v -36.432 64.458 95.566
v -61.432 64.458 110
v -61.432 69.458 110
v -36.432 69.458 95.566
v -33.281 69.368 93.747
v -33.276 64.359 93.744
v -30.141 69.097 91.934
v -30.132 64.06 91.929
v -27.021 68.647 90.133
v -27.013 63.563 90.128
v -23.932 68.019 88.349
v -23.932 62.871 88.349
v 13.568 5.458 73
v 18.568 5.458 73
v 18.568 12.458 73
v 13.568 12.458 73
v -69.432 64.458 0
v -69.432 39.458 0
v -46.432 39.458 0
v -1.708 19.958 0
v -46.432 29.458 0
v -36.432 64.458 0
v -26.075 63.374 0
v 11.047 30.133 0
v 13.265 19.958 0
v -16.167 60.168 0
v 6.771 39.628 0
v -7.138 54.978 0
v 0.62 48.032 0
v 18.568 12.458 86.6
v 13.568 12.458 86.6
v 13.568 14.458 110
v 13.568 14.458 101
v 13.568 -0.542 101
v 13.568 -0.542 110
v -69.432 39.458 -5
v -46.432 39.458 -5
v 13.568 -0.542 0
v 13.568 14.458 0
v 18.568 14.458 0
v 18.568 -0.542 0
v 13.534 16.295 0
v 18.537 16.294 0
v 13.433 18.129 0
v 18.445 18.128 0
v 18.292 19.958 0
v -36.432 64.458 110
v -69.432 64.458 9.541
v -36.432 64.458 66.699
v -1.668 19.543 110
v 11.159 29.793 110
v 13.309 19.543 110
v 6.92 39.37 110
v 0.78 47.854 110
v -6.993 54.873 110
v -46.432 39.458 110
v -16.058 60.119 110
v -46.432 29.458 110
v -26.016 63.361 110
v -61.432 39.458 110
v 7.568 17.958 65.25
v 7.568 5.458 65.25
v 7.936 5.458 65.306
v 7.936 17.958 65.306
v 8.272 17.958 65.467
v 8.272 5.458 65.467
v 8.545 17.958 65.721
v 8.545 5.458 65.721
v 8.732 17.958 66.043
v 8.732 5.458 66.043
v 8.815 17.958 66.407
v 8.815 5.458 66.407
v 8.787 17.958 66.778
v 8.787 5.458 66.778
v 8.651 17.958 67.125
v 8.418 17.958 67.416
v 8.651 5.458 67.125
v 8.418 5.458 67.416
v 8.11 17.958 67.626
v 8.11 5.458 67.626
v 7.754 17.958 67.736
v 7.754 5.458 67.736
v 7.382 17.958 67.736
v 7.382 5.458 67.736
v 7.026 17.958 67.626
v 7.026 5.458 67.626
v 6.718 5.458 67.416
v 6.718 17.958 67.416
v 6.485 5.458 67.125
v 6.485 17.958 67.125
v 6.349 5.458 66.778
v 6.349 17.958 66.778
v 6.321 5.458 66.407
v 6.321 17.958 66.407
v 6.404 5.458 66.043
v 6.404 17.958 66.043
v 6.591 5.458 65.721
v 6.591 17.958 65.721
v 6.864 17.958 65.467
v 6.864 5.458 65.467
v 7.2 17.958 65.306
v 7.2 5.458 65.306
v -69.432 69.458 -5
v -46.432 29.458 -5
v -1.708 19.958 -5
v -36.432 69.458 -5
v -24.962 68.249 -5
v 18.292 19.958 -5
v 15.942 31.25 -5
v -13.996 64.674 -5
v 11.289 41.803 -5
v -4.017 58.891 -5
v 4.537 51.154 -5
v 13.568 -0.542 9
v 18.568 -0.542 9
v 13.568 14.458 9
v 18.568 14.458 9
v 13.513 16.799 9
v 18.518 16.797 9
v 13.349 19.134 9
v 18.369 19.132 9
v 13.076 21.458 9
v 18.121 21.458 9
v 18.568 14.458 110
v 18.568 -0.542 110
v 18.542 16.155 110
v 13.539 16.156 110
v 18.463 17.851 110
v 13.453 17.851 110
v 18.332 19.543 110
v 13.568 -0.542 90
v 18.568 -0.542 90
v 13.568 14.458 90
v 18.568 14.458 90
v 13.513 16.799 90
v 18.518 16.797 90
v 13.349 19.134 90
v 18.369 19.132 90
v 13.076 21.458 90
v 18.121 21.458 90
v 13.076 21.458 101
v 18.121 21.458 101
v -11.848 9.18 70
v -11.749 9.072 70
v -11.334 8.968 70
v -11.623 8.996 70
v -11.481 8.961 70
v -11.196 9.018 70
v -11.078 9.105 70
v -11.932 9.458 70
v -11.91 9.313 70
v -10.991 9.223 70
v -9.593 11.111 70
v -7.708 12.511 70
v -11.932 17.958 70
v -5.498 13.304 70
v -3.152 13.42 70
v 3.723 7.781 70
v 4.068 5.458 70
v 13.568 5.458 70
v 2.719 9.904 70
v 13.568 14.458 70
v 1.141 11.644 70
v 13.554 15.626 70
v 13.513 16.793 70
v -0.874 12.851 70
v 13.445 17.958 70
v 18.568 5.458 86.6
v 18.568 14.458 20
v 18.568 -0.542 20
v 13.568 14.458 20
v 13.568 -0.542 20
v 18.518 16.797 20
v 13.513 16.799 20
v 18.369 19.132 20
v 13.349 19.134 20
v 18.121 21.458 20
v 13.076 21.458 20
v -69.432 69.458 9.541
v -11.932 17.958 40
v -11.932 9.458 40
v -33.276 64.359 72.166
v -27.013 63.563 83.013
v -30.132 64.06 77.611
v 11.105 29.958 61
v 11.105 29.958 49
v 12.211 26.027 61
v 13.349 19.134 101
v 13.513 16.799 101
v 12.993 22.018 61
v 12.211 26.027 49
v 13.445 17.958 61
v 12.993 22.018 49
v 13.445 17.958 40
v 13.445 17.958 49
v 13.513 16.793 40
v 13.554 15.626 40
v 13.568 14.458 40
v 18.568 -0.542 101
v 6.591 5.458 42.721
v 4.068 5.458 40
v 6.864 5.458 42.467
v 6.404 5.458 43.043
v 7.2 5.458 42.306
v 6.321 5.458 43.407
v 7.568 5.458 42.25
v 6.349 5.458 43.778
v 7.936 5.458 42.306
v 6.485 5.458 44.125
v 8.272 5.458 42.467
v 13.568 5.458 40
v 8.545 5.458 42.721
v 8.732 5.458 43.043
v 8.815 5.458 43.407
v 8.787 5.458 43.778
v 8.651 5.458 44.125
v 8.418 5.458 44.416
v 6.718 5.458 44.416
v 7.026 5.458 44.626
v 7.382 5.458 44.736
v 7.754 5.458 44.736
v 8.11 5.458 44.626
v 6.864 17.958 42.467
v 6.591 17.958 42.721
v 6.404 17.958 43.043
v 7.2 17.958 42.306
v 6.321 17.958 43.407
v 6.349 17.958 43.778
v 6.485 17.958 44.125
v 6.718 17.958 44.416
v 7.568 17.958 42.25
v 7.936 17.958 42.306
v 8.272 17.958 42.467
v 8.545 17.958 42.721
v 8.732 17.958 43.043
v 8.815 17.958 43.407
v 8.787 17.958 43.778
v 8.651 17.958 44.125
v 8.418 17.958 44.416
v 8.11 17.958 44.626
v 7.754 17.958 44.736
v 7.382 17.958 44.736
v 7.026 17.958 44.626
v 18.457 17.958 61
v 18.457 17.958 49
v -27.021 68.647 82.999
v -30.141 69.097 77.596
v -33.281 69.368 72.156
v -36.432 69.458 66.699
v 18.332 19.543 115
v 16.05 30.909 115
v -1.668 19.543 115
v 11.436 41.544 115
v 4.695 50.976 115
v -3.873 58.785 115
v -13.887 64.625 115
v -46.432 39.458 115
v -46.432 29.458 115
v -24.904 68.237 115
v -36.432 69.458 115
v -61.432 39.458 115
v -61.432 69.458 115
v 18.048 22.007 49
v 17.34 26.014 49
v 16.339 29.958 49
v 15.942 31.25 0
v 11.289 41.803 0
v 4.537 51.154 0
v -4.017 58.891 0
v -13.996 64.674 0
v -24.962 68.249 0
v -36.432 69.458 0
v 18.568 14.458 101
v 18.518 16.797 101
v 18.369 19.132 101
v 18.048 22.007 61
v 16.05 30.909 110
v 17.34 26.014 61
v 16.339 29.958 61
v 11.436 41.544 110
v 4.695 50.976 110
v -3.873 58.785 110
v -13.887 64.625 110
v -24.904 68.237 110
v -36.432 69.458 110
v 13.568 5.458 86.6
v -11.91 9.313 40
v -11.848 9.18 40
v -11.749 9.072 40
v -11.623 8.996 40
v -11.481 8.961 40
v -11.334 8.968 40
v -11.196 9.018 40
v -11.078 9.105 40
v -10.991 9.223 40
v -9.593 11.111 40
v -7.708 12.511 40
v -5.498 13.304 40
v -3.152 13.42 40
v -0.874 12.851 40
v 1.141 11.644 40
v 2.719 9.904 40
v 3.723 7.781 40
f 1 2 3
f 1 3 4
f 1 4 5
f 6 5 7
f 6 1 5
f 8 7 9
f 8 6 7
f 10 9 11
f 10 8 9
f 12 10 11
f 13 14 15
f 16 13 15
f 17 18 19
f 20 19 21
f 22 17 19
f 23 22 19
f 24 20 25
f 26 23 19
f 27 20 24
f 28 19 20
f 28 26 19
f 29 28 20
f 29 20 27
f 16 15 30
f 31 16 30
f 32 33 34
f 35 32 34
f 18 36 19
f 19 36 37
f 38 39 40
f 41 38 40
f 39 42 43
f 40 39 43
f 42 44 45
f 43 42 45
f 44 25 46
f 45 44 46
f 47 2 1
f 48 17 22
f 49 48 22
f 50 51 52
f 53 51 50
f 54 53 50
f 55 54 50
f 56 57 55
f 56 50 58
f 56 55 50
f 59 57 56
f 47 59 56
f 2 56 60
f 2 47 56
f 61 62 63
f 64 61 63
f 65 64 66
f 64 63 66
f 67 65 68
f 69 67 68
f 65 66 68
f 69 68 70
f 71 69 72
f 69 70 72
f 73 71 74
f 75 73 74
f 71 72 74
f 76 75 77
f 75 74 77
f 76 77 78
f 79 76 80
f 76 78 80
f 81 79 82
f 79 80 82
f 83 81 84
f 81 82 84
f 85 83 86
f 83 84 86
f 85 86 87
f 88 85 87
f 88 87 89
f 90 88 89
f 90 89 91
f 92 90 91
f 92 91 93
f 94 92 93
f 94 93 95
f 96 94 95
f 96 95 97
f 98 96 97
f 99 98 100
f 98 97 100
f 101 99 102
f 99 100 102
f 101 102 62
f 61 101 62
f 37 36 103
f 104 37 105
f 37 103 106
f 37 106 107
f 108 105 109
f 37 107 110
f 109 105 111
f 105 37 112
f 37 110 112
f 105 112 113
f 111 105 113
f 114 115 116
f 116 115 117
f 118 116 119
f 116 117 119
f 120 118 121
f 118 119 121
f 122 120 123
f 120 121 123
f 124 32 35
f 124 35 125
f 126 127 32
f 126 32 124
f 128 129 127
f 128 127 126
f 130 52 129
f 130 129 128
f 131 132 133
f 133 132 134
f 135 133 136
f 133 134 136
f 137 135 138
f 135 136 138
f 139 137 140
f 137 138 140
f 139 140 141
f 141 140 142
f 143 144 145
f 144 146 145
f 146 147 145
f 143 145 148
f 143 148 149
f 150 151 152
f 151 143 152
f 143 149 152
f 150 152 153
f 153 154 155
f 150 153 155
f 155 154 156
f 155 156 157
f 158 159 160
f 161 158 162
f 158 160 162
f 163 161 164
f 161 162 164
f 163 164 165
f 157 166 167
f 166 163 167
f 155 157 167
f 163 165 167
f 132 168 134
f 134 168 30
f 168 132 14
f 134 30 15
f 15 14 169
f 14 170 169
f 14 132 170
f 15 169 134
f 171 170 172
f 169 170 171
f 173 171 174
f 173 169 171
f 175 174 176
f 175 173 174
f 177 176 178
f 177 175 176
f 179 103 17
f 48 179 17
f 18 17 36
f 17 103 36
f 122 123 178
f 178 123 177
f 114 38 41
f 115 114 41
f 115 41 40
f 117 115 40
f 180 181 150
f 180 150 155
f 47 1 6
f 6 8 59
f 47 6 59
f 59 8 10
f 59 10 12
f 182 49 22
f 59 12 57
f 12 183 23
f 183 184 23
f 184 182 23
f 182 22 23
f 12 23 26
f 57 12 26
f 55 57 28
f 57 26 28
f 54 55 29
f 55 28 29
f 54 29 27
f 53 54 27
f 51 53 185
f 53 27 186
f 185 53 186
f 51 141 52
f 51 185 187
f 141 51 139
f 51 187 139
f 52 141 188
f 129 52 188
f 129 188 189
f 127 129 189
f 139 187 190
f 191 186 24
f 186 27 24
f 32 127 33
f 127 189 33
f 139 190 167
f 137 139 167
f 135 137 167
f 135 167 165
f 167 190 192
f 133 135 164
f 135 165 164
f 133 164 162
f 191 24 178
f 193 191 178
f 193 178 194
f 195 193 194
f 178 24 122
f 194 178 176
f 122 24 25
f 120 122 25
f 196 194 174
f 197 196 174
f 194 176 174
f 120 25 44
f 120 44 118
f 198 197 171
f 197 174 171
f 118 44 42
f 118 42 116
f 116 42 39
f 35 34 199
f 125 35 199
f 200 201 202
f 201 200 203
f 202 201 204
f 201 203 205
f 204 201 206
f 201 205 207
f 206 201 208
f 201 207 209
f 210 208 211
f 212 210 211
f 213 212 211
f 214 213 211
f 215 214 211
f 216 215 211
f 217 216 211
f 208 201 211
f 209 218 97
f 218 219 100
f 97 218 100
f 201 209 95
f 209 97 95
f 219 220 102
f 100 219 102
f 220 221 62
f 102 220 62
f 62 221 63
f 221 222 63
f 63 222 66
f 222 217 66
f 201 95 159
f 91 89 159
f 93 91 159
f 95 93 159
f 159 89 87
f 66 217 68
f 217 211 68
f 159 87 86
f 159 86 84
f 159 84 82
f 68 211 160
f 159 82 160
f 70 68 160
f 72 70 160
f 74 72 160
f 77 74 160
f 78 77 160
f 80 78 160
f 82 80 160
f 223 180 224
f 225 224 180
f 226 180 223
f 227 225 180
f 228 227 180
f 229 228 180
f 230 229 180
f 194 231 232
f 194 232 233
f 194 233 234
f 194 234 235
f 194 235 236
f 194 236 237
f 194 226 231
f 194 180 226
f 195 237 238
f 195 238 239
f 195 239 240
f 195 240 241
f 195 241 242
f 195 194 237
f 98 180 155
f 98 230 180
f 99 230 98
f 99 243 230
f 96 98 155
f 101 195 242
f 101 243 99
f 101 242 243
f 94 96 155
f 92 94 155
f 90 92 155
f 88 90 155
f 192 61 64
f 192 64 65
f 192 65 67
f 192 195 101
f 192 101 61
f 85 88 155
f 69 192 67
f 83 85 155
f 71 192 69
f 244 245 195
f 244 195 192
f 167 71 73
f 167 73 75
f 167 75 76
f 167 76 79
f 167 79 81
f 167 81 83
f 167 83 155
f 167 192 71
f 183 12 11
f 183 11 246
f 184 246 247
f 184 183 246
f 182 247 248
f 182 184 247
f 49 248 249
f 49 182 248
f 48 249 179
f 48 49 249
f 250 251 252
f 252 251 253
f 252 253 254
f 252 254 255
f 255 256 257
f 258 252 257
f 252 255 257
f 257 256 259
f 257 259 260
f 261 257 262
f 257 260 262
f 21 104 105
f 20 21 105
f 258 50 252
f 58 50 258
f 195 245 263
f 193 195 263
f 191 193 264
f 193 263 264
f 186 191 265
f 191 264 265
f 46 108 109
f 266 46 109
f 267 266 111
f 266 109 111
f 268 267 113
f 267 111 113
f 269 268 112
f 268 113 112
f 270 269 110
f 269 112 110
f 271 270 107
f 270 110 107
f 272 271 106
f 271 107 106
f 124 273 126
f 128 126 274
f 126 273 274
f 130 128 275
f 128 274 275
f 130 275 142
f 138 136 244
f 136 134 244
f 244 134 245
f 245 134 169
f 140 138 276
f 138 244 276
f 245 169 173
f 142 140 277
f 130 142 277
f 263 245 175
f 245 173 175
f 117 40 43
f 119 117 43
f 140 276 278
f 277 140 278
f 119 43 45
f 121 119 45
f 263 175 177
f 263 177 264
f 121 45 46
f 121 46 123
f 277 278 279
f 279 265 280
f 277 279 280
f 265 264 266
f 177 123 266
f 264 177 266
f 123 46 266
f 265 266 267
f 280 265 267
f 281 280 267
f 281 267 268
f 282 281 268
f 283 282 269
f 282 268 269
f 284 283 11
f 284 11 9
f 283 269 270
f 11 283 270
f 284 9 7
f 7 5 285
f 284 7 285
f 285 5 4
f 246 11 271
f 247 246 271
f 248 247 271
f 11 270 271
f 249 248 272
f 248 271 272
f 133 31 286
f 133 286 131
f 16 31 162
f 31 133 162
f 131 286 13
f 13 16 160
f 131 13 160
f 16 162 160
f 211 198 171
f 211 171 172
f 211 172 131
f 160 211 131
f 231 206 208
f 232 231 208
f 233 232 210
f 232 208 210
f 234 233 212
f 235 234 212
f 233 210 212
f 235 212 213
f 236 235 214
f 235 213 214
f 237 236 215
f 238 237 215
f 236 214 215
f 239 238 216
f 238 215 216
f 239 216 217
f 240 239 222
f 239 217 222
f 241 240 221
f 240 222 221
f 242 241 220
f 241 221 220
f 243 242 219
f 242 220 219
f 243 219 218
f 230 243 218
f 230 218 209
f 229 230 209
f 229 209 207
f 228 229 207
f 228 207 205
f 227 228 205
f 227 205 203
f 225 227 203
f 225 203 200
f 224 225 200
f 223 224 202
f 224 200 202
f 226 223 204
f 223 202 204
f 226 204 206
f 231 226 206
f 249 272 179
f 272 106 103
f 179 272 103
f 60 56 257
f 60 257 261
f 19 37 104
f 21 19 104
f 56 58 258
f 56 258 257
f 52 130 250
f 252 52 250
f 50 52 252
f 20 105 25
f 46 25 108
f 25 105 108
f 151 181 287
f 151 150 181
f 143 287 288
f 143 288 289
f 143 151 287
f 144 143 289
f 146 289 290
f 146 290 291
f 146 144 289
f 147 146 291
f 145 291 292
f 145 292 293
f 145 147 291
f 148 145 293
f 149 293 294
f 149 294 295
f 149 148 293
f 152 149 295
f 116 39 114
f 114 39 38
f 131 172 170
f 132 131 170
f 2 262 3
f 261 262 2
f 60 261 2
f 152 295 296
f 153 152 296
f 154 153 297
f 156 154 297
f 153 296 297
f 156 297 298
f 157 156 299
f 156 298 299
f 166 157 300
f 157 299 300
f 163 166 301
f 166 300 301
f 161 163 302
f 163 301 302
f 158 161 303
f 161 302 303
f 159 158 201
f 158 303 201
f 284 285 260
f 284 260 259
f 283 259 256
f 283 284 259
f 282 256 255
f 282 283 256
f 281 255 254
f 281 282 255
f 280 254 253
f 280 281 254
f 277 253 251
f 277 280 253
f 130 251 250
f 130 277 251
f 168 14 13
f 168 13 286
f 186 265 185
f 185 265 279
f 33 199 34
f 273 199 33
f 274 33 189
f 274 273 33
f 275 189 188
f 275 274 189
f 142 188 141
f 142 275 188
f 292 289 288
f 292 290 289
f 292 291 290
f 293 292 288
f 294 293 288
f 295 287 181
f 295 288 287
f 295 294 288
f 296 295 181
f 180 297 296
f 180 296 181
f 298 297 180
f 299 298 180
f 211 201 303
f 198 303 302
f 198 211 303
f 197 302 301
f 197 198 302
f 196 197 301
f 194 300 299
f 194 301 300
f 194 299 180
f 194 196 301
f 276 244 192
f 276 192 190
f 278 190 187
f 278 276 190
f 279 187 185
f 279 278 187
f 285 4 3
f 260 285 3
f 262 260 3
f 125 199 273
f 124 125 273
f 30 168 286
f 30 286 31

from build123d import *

# Parameters (mm, degrees)
BOSS_EXTRUDE1_DEPTH     = 110
SKETCH2_W               = 30
SKETCH2_H               = 12.5
BOSS_EXTRUDE2_DEPTH     = 35
SKETCH3_R               = 8
CUT_EXTRUDE1_DEPTH      = 121.603742452
SKETCH4_R               = 1.5
SKETCH4_R_2             = 1.25
CUT_EXTRUDE2_DEPTH      = 12.5
SKETCH5_W               = 9.5
SKETCH5_H               = 12.5
CUT_EXTRUDE3_DEPTH      = 121.603742452
FILLET4_R               = 0.5
BOSS_EXTRUDE3_DEPTH     = 5
CUT_EXTRUDE4_DEPTH      = 158.919156753
CUT_EXTRUDE4_DEPTH_BACK = 158.919156753
SKETCH7_W               = 12
SKETCH7_H               = 12
SKETCH7_W_2             = 11
SKETCH7_H_2             = 22
SKETCH7_W_3             = 13.6
SKETCH7_H_3             = 7
BOSS_EXTRUDE4_START     = 5
BOSS_EXTRUDE4_DEPTH     = 5
CUT_EXTRUDE5_START      = -30
CUT_EXTRUDE5_DEPTH      = 30


# Read off the part's stored shape, not the designer's step: Cut-Extrude5
with BuildPart() as part:
    # Sketch1 → Boss-Extrude1 (new body)
    with BuildSketch(Plane.XY):
        with BuildLine():
            Line((13.568, -0.541666667), (18.568, -0.541666667))
            Line((18.568, -0.541666667), (18.568, 14.458333333))
            ThreePointArc((18.568, 14.458333333), (2.458872965, 53.349206299), (-36.432, 69.458333333))
            Line((-36.432, 69.458333333), (-69.432, 69.458333333))
            Line((-69.432, 69.458333333), (-69.432, 64.458333333))
            Line((-69.432, 64.458333333), (-36.432, 64.458333333))
            ThreePointArc((-36.432, 64.458333333), (-1.076660941, 49.813672393), (13.568, 14.458333333))
            Line((13.568, 14.458333333), (13.568, -0.541666667))
        make_face()
    extrude(amount=BOSS_EXTRUDE1_DEPTH)

    # Sketch2 → Boss-Extrude2 (add)
    with BuildSketch(Plane.ZY.offset(-13.568)):
        with Locations((55, 11.708333333)):
            Rectangle(SKETCH2_W, SKETCH2_H)
    extrude(amount=BOSS_EXTRUDE2_DEPTH)

    # Sketch3 → Cut-Extrude1 (cut, through all)
    with BuildSketch(Plane(origin=(0, 0, 40), x_dir=(-1, 0, 0), z_dir=(0, 0, -1))):
        with Locations((3.932, 5.458333333)):
            Circle(SKETCH3_R)
    extrude(amount=-CUT_EXTRUDE1_DEPTH, mode=Mode.SUBTRACT)

    # Sketch4 → Cut-Extrude2 (cut)
    with BuildSketch(Plane.XZ.offset(-5.458333333)):
        with Locations(Location((-17.932, 43.5, 0), (0, 0, 270))):
            Circle(SKETCH4_R)
        with Locations(Location((-17.932, 66.5, 0), (0, 0, 270))):
            Circle(SKETCH4_R)
        with Locations(Location((7.568, 43.5, 0), (0, 0, 270))):
            Circle(SKETCH4_R_2)
        with Locations(Location((7.568, 66.5, 0), (0, 0, 270))):
            Circle(SKETCH4_R_2)
    extrude(amount=-CUT_EXTRUDE2_DEPTH, mode=Mode.SUBTRACT)

    # Sketch5 → Cut-Extrude3 (cut, through all)
    with BuildSketch(Plane(origin=(0, 0, 40), x_dir=(-1, 0, 0), z_dir=(0, 0, -1))):
        with Locations((16.682, 11.708333333)):
            Rectangle(SKETCH5_W, SKETCH5_H)
    extrude(amount=-CUT_EXTRUDE3_DEPTH, mode=Mode.SUBTRACT)

    # Fillet4
    fillet4_edges = [part.edges().sort_by_distance(p)[0] for p in [
        (-11.932, 5.458333333, 55),
    ]]
    fillet(fillet4_edges, radius=FILLET4_R)

    # Sketch6 → Boss-Extrude3 (add)
    with BuildSketch(Plane.XY.offset(110)):
        with BuildLine():
            Line((18.332493433, 19.542648335), (-1.667506567, 19.542648335))
            Line((-1.667506567, 19.542648335), (-46.432, 29.458333333))
            Line((-46.432, 29.458333333), (-46.432, 39.458333333))
            Line((-46.432, 39.458333333), (-69.432, 39.458333333))
            Line((-69.432, 39.458333333), (-69.432, 69.458333333))
            Line((-69.432, 69.458333333), (-36.432, 69.458333333))
            ThreePointArc((-36.432, 69.458333333), (0.617714404, 55.1070561), (18.332493433, 19.542648335))
        make_face()
    extrude(amount=BOSS_EXTRUDE3_DEPTH)

    # Sketch7 → Cut-Extrude4 (cut, two sides: drawn at the far end of the back side and taken through both)
    with BuildSketch(Plane.ZY.offset(-13.568).offset(-CUT_EXTRUDE4_DEPTH_BACK)):
        with Locations((55, 23.958333333)):
            Rectangle(SKETCH7_W, SKETCH7_H)
        with Locations((95.5, 10.458333333)):
            Rectangle(SKETCH7_W_2, SKETCH7_H_2)
        with Locations((14.5, 10.458333333)):
            Rectangle(SKETCH7_W_2, SKETCH7_H_2)
        with Locations((79.8, 8.958333333)):
            Rectangle(SKETCH7_W_3, SKETCH7_H_3)
    extrude(amount=CUT_EXTRUDE4_DEPTH + CUT_EXTRUDE4_DEPTH_BACK, mode=Mode.SUBTRACT)

    # Sketch8 → Boss-Extrude4 (add)
    with BuildSketch(Plane(origin=(0, 0, 0), x_dir=(-1, 0, 0), z_dir=(0, 0, -1)).offset(BOSS_EXTRUDE4_START)):
        with BuildLine():
            Line((36.432, 69.458333333), (69.432, 69.458333333))
            Line((69.432, 69.458333333), (69.432, 64.458333333))
            Line((69.432, 64.458333333), (69.432, 39.458333333))
            Line((69.432, 39.458333333), (46.432, 39.458333333))
            Line((46.432, 39.458333333), (46.432, 29.458333333))
            Line((46.432, 29.458333333), (1.707690959, 19.958333333))
            Line((1.707690959, 19.958333333), (-18.292309041, 19.958333333))
            ThreePointArc((-18.292309041, 19.958333333), (-0.463121629, 55.247425012), (36.432, 69.458333333))
        make_face()
    extrude(amount=-BOSS_EXTRUDE4_DEPTH)

    # Cut-Extrude5 outline → Cut-Extrude5 (cut)
    with BuildSketch(Plane(origin=(0, 69.458333333, 0), x_dir=(1, 0, 0), z_dir=(0, 1, 0)).offset(CUT_EXTRUDE5_START)):
        Polygon((-23.932, -88.349364905), (-69.432, -9.541053161), (-69.432, -115), (-61.432, -115), (-61.432, -110), align=None)
    extrude(amount=CUT_EXTRUDE5_DEPTH, mode=Mode.SUBTRACT)


solid = part.part
